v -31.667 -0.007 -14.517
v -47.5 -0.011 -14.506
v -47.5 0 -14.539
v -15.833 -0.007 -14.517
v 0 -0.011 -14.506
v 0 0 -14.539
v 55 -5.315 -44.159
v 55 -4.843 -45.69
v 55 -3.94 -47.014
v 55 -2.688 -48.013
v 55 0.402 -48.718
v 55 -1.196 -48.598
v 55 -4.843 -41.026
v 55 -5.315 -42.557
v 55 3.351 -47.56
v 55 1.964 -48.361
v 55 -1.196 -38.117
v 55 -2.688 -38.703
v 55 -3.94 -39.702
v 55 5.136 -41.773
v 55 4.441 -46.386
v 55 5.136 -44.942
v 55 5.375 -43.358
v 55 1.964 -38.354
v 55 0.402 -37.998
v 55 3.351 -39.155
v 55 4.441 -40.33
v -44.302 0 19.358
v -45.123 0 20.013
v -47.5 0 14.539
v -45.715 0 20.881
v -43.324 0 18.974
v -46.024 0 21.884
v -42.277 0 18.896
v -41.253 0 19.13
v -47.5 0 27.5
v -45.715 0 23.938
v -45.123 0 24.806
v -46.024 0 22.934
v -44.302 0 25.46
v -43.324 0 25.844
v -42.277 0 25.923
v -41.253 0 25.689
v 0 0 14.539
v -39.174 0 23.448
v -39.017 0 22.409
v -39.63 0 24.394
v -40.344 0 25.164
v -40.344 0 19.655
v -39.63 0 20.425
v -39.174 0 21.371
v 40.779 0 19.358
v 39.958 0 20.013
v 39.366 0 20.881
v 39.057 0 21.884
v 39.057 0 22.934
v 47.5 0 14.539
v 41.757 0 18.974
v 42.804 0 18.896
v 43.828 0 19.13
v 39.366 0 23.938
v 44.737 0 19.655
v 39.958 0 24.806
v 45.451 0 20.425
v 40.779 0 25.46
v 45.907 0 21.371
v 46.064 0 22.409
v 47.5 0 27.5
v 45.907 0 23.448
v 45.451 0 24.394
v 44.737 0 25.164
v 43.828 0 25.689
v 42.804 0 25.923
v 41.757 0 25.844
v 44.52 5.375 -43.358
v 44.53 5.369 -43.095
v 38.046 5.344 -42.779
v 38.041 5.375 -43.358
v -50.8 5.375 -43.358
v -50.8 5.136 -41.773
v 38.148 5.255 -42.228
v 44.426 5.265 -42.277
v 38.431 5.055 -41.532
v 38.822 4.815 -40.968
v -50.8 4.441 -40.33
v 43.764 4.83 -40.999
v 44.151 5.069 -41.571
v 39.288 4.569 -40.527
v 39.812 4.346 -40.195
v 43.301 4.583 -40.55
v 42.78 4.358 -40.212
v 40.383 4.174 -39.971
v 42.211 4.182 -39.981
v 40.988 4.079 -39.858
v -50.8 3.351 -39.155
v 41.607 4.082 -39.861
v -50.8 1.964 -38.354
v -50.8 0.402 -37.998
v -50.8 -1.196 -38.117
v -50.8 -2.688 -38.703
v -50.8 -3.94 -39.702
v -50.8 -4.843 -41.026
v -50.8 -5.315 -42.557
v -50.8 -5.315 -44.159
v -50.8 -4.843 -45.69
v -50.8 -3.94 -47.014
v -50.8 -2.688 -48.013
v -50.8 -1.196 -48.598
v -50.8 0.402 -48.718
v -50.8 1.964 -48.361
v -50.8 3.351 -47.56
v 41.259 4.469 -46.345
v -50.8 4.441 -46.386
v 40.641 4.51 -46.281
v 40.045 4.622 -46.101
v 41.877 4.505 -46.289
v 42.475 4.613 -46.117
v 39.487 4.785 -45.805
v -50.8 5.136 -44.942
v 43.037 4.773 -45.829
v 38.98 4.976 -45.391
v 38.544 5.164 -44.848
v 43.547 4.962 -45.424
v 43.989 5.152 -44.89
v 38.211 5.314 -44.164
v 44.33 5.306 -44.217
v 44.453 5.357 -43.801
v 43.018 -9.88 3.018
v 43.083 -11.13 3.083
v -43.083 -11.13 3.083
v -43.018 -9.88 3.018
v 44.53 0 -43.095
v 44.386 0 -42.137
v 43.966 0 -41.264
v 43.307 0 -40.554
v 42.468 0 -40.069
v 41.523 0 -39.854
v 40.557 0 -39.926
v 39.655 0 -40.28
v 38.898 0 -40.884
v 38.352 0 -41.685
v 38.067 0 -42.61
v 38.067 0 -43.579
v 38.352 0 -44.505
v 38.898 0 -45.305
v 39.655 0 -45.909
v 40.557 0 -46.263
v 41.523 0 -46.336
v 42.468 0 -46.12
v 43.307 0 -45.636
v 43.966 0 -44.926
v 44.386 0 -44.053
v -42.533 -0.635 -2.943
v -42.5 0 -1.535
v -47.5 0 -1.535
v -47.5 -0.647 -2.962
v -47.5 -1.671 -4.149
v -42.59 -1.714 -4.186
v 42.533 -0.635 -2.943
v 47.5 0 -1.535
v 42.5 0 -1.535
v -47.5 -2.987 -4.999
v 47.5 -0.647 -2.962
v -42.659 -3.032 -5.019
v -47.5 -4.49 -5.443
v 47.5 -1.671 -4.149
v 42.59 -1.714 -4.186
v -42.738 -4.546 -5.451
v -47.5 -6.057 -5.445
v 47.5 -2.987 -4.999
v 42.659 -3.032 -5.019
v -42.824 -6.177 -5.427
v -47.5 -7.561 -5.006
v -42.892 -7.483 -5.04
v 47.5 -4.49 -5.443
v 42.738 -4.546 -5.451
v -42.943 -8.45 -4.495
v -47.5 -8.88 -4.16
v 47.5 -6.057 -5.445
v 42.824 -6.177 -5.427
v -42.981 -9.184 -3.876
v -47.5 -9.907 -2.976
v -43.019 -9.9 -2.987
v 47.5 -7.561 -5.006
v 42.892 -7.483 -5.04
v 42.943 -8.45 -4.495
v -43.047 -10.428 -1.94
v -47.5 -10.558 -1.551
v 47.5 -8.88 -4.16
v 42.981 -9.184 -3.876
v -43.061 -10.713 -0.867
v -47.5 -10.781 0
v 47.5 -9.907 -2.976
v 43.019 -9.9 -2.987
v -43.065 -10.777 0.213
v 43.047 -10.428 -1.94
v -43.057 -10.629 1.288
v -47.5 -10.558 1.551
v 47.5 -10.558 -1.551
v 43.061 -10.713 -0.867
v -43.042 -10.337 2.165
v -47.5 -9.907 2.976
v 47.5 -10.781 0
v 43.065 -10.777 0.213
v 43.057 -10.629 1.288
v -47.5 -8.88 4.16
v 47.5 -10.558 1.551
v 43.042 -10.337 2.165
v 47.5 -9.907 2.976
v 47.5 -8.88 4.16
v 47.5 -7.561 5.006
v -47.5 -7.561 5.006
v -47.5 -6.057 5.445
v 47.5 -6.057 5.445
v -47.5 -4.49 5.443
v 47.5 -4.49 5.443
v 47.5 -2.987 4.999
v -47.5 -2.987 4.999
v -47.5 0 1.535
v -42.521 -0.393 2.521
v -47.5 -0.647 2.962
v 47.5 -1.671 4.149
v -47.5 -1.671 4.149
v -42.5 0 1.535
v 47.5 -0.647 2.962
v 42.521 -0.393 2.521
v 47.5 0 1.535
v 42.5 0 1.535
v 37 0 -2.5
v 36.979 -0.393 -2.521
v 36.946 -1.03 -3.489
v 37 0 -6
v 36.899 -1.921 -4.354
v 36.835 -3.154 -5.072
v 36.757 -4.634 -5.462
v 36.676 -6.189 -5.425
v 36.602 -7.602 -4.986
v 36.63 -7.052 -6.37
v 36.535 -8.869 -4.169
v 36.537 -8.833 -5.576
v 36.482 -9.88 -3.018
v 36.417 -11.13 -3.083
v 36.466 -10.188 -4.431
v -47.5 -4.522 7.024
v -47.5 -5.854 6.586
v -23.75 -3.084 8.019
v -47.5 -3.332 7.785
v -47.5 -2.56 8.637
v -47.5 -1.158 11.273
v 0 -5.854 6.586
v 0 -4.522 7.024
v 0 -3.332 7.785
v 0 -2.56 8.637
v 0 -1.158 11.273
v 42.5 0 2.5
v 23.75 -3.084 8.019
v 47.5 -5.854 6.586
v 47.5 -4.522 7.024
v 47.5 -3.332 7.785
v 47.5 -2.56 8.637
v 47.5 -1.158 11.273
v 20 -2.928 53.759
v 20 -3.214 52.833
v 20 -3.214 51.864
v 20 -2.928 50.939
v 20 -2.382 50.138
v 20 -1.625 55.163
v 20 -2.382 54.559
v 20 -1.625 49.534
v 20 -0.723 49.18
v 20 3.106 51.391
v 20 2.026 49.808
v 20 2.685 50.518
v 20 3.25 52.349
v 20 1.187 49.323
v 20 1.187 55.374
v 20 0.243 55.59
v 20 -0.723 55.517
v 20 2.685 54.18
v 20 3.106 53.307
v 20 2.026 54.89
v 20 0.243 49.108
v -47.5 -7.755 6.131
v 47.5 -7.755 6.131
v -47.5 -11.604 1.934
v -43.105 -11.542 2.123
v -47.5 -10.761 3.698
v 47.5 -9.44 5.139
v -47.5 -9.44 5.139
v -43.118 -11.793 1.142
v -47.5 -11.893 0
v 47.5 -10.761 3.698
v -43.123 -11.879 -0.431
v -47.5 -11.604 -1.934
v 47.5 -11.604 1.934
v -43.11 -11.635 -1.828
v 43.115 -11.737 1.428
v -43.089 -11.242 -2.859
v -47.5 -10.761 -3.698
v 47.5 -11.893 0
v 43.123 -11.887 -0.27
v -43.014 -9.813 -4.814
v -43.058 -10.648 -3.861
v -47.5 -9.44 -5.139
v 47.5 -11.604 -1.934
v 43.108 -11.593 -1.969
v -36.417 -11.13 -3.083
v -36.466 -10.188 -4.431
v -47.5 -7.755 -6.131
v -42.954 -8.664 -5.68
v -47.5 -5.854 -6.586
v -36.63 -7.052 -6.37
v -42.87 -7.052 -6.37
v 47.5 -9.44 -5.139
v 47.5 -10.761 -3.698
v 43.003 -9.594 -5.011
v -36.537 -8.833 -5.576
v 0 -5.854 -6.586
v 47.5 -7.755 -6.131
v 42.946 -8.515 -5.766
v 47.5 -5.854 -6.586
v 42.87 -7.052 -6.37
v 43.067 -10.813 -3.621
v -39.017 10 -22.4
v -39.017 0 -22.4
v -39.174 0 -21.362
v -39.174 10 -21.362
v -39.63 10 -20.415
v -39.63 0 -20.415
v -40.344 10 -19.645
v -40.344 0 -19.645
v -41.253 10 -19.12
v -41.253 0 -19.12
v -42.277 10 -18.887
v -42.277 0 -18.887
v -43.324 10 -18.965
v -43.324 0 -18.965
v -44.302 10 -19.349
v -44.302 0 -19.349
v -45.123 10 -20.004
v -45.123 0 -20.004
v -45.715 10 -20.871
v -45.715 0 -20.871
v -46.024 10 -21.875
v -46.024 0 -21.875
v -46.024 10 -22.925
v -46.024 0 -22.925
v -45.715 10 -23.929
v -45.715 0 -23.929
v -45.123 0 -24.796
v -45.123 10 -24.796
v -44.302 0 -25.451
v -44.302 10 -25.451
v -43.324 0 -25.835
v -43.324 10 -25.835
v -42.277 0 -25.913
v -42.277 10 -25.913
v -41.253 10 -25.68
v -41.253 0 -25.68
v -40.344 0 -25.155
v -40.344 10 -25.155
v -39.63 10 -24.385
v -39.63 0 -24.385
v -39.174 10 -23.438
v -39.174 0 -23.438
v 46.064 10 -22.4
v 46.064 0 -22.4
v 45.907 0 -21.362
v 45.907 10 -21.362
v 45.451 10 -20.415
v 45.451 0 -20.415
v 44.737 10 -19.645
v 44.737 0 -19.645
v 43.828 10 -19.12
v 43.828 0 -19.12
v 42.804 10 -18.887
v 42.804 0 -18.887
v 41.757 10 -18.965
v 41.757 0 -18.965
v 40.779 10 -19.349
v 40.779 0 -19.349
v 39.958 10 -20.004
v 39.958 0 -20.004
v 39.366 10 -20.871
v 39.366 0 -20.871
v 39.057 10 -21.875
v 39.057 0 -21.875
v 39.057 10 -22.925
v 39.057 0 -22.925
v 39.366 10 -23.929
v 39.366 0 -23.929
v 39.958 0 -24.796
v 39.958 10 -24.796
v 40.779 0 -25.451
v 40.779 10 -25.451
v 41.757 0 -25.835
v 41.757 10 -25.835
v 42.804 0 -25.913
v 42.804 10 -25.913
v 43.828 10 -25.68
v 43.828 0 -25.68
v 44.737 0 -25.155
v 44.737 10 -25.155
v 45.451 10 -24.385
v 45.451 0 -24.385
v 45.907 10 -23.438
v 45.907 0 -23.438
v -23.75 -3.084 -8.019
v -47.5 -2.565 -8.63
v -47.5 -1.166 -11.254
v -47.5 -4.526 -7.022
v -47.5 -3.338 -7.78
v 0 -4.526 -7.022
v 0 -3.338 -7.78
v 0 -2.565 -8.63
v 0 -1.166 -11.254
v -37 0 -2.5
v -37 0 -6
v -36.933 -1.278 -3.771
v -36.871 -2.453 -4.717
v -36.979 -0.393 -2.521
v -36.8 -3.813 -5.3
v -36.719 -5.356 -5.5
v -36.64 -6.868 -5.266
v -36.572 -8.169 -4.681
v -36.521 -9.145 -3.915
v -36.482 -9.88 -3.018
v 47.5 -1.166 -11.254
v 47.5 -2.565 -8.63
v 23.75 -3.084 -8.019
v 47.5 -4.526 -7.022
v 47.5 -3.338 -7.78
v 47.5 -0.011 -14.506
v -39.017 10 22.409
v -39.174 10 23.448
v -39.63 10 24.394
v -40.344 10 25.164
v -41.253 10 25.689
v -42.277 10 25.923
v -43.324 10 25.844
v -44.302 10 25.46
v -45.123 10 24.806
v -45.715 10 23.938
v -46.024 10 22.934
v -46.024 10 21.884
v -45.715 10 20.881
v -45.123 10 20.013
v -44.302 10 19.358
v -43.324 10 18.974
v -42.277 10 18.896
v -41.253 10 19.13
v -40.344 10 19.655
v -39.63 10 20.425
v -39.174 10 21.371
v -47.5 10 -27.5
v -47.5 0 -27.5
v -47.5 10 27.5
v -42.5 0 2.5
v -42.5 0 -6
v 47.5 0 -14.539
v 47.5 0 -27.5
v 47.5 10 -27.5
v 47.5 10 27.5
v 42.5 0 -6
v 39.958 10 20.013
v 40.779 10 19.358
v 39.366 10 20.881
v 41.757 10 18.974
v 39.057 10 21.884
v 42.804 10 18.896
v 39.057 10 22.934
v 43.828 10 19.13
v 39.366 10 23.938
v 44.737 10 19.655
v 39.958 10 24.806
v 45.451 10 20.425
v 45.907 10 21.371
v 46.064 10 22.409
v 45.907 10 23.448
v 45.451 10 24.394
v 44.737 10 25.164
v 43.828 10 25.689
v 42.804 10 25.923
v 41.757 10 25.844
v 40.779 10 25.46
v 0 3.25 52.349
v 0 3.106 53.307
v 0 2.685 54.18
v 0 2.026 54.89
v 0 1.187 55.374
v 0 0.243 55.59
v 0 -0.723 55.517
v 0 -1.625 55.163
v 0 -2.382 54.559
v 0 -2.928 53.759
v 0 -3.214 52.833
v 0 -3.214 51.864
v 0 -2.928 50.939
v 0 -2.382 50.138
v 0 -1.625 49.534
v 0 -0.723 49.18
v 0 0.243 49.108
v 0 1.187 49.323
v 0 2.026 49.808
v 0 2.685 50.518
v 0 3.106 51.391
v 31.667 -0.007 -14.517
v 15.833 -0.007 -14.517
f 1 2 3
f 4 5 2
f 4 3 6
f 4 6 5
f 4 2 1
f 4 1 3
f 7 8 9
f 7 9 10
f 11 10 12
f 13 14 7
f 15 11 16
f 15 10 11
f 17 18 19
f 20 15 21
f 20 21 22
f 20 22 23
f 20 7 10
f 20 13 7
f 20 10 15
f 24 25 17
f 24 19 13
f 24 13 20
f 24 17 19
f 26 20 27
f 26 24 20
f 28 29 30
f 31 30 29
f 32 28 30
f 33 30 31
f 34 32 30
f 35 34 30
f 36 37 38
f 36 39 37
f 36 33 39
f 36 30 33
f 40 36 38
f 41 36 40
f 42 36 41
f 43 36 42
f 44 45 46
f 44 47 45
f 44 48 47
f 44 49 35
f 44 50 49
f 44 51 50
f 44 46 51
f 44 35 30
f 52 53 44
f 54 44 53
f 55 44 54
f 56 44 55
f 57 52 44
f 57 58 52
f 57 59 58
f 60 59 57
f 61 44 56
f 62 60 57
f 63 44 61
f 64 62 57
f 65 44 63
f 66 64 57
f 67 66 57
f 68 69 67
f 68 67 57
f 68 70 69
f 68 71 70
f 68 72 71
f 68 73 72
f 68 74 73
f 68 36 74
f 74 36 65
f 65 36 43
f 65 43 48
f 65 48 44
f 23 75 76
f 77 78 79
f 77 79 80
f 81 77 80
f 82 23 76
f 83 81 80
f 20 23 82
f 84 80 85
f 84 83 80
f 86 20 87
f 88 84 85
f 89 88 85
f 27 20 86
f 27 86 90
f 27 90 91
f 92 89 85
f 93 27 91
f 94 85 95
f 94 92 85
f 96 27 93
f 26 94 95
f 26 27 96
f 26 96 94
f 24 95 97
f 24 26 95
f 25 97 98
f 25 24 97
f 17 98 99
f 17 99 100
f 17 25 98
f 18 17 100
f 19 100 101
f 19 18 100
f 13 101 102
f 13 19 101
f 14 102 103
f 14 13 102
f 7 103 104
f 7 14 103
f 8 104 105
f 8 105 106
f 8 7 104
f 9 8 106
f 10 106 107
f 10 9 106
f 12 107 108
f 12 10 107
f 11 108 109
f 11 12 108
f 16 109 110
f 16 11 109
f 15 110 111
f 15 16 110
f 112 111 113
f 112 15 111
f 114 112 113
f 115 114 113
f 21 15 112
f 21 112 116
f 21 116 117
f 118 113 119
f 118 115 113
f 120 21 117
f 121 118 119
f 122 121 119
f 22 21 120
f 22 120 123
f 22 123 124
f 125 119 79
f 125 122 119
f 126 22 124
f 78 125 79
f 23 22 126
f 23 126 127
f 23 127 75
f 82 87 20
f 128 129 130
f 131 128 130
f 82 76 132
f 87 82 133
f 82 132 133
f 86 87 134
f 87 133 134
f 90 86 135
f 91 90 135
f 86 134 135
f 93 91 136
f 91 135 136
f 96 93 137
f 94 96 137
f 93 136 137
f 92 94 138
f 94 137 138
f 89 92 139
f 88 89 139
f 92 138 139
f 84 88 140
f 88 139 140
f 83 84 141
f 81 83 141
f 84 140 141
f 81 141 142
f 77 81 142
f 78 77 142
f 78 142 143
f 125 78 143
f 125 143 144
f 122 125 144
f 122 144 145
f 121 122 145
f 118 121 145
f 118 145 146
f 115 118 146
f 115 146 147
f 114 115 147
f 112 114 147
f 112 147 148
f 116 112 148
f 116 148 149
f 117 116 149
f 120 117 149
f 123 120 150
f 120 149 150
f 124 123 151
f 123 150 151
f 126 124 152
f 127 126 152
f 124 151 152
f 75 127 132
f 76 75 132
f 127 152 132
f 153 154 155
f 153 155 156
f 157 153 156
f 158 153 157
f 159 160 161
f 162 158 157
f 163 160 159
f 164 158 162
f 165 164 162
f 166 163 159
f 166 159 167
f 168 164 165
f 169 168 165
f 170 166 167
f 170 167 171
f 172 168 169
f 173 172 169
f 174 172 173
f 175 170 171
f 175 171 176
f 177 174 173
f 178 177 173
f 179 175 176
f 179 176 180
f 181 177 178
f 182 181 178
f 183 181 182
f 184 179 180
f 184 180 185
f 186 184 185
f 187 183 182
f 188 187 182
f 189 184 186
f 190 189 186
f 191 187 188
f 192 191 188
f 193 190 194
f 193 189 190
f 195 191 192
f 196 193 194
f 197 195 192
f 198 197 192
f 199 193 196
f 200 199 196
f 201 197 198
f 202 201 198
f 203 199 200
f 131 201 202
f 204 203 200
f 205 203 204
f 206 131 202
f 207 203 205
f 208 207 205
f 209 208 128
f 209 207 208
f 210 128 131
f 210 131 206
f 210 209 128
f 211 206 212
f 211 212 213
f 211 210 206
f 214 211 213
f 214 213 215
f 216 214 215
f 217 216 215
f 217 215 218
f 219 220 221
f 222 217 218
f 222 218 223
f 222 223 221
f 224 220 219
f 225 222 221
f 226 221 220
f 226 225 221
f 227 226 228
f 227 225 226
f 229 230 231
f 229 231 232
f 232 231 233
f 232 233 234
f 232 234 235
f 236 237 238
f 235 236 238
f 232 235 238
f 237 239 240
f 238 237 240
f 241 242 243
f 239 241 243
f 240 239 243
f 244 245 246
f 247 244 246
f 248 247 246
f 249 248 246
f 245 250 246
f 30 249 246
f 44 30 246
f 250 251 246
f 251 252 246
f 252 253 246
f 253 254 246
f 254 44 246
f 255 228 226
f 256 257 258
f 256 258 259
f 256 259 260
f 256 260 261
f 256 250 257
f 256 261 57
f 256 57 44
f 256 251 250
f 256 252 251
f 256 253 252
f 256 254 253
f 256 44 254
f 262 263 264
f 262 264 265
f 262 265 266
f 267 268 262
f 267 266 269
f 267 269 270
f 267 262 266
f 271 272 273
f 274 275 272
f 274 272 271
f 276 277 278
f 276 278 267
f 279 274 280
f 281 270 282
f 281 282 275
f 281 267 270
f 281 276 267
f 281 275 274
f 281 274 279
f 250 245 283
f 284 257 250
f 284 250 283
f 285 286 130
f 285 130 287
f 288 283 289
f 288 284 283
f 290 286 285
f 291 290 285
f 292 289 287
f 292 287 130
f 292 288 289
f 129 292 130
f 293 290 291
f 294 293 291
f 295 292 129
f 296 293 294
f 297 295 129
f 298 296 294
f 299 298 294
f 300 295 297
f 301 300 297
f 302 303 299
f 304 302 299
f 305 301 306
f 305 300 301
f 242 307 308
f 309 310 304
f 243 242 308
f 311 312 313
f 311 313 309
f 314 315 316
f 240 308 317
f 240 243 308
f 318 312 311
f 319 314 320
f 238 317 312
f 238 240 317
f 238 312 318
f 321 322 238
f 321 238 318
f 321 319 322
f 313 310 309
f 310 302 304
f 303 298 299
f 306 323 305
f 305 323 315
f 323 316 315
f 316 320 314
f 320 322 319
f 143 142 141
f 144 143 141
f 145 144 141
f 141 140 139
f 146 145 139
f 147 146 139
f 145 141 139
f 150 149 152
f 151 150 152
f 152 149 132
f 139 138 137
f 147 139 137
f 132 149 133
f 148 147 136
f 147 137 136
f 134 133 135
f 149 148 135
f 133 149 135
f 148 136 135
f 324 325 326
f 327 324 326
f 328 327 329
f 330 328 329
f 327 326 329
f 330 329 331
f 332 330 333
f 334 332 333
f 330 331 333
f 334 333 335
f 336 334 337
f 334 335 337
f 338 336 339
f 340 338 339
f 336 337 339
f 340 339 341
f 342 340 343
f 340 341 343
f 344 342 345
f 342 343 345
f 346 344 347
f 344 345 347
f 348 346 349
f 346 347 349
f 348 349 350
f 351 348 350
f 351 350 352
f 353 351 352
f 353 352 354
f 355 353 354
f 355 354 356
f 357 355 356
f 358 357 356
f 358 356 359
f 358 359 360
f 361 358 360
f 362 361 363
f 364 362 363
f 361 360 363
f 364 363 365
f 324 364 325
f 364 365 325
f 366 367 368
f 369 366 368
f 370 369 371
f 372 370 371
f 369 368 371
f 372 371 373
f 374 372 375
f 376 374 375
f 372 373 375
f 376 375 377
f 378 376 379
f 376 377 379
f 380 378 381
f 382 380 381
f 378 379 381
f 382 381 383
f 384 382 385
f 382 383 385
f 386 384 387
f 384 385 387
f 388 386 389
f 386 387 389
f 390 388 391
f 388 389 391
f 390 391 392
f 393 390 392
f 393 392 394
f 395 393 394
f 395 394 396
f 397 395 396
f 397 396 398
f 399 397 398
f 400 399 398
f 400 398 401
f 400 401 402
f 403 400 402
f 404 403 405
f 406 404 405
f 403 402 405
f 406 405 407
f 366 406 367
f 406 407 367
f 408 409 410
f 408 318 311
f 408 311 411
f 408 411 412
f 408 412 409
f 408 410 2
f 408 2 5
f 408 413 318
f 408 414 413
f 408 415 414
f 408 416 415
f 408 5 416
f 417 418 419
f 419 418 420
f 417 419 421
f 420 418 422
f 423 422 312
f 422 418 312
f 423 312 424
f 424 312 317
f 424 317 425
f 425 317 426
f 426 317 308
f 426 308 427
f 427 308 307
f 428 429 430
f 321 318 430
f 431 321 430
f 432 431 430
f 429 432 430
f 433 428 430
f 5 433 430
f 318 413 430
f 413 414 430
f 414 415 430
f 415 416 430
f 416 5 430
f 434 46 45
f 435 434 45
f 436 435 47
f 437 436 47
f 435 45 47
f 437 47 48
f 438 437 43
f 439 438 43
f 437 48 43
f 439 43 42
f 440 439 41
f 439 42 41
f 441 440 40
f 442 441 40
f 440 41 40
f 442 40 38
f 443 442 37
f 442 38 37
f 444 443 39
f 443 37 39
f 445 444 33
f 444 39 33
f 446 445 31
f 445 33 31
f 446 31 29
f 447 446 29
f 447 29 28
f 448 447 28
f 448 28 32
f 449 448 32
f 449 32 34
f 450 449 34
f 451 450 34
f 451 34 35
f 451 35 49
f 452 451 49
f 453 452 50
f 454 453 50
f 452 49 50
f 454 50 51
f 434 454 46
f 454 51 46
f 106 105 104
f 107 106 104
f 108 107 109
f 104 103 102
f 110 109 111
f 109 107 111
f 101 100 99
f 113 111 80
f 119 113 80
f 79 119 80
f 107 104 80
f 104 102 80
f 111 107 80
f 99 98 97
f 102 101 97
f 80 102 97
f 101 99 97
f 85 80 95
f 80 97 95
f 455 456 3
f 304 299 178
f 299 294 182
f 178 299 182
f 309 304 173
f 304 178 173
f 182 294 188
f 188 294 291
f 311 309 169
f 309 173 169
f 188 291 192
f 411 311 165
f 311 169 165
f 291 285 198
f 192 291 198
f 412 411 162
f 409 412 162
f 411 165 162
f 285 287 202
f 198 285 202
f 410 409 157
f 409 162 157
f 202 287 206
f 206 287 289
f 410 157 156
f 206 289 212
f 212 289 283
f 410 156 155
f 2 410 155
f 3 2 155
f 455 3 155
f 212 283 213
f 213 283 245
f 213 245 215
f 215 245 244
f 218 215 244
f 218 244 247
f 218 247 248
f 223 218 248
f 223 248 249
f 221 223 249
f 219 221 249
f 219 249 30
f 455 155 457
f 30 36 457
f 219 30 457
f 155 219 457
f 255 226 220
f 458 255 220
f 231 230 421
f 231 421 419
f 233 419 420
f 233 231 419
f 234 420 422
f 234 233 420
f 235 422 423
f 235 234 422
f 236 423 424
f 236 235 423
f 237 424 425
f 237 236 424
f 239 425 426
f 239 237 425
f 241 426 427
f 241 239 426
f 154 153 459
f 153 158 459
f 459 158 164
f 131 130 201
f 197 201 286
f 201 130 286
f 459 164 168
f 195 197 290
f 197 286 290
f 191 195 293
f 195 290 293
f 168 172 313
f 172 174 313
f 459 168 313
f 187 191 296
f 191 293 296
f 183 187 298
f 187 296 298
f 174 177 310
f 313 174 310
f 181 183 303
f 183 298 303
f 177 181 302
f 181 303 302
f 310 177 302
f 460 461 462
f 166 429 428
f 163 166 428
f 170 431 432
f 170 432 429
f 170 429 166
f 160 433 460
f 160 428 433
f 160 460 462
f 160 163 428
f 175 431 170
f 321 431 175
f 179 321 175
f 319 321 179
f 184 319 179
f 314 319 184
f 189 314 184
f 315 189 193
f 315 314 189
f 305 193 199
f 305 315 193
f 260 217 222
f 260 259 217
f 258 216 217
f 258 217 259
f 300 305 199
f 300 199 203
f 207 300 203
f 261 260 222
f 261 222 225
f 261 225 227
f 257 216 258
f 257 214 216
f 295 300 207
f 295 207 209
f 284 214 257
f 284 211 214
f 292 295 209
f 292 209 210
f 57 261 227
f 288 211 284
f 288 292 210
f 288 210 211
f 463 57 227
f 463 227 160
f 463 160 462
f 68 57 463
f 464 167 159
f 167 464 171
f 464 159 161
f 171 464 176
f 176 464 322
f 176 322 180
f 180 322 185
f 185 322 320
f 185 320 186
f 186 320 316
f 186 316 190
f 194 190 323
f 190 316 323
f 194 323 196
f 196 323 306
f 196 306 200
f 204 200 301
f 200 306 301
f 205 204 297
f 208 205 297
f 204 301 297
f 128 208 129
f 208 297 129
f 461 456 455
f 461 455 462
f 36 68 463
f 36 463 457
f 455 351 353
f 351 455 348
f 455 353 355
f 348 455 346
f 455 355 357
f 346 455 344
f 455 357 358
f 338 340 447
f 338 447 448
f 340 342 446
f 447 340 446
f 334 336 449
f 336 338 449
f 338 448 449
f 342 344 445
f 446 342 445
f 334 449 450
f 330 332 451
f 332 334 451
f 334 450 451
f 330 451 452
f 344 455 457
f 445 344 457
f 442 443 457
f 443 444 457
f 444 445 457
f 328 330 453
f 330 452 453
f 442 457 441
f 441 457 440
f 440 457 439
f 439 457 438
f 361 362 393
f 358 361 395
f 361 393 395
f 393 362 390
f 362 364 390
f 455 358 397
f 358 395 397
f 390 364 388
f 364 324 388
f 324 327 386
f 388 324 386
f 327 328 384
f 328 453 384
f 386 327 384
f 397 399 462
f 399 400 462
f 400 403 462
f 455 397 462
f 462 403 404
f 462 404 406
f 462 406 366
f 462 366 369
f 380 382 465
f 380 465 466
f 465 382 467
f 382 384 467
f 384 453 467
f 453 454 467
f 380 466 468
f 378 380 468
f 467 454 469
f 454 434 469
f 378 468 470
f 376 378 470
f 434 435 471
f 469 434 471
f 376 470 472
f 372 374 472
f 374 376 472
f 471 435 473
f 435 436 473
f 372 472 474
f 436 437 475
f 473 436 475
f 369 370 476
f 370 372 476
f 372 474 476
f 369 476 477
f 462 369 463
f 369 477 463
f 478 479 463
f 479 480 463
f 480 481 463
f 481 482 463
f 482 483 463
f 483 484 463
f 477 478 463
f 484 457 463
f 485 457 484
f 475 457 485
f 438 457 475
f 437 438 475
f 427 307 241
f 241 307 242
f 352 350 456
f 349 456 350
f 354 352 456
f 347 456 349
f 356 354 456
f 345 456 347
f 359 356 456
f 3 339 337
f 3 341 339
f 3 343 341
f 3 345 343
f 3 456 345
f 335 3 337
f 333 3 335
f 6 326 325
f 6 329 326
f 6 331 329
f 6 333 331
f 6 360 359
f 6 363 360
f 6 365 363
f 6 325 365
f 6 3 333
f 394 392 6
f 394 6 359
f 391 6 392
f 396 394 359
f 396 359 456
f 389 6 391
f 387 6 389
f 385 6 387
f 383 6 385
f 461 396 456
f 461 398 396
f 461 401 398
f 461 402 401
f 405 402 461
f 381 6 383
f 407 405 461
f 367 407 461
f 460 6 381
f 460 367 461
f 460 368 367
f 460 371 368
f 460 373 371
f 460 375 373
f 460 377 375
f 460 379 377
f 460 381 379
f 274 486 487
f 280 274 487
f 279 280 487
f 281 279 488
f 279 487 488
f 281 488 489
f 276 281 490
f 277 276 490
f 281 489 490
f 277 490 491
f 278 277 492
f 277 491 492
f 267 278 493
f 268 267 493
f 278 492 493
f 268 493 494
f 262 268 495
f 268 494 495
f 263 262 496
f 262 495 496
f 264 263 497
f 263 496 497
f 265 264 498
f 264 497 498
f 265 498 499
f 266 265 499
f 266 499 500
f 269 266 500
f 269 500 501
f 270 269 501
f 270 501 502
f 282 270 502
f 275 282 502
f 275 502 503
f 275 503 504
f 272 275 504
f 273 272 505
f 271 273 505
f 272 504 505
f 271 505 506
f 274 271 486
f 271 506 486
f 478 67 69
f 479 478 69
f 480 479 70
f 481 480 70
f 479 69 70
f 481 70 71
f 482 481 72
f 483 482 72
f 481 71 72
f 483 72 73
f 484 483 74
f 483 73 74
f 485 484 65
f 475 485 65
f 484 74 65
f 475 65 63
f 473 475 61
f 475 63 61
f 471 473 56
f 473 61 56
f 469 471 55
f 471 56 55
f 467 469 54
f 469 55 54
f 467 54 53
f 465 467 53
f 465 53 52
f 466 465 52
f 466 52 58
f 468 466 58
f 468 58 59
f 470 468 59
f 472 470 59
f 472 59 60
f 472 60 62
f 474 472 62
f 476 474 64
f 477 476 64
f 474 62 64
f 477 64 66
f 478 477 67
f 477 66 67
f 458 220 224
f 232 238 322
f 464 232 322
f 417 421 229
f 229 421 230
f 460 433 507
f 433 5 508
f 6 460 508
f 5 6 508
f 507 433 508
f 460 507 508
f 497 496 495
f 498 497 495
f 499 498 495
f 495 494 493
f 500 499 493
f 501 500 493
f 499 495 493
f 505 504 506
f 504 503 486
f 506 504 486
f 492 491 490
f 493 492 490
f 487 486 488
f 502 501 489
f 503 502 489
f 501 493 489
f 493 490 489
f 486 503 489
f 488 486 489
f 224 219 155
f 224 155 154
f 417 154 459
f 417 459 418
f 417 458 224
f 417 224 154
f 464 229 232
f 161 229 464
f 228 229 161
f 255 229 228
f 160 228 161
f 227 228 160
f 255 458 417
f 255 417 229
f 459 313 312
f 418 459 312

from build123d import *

# Parameters (mm, degrees)
F0_W      = 47.5
F0_H      = 55
F0_R      = 3.5231538004
F2_DEPTH  = 10
F3_DEPTH  = 47.5
F4_DEPTH  = 47.5
F5_W      = 5.5
F5_H      = 3.5
F6_DEPTH  = 116
F6_TAPER  = -3
F7_R      = 5.375
F8_DEPTH  = 55
F9_DEPTH  = 50.8
F10_R     = 3.25
F11_DEPTH = 25
F12_R     = 3.25
F13_DEPTH = 20


# Not quite as in the source:
# - an extrude ends at something that could not be found from the text; its depth is read off the source's solid


with BuildPart() as f2:
    # F0 (on Front) → F2 (new body)
    with BuildSketch(Plane.XZ):
        with Locations((-23.75, 0)):
            Rectangle(F0_W, F0_H)
        with Locations((-42.5404943526, -22.3999973387)):
            Circle(F0_R, mode=Mode.SUBTRACT)
        with Locations((-42.5404943526, 22.4092733115)):
            Circle(F0_R, mode=Mode.SUBTRACT)
        with Locations((23.75, 0)):
            Rectangle(F0_W, F0_H)
        with Locations((42.5404943526, -22.3999973387)):
            Circle(F0_R, mode=Mode.SUBTRACT)
        with Locations((42.5404943526, 22.4092733115)):
            Circle(F0_R, mode=Mode.SUBTRACT)
    extrude(amount=-F2_DEPTH)

    # F1 (on Right) → F3 (join)
    with BuildSketch(Plane.YZ):
        with BuildLine():
            ThreePointArc((0, -3.9765159025), (0.9884114859, -2.0964597633), (1.32962229, 0))
            ThreePointArc((1.32962229, 0), (0.9884114859, 2.0964597633), (0, 3.9765159025))
            Line((0, 3.9765159025), (0, 1.5348697397))
            ThreePointArc((0, 1.5348697397), (0.1636057764, 0.7751725864), (0.2185063777, 0))
            ThreePointArc((0.2185063777, 0), (0.1636057764, -0.7751725864), (0, -1.5348697397))
            Line((0, -1.5348697397), (0, -3.9765159025))
        make_face()
        with BuildLine():
            Line((0, -14.5392882731), (0, -14.5063873886))
            Line((0, -14.5063873886), (-0.0106325767, -14.5063873886))
            add(Edge.make_bspline(
                [(-0.0106325767, -14.5063873886), (-0.0070875742, -14.5173526167), (-0.0035433916, -14.5283196043), (0, -14.5392882731)],
                knots=[0.9975914602, 0.9975914602, 0.9975914602, 0.9975914602, 1, 1, 1, 1], degree=3))
        make_face()
        with BuildLine():
            Line((0, -14.5063873886), (0, -3.9765159025))
            ThreePointArc((0, -3.9765159025), (-2.5895292088, -6.0382266604), (-5.8538725864, -6.5862915155))
            add(Edge.make_bspline(
                [(-5.8538725864, -6.5862915155), (-4.8215552648, -6.8255458917), (-2.2801846921, -7.8765294876), (-0.8570999414, -11.8881360206), (-0.0106325767, -14.5063873886)],
                knots=[0.0813250355, 0.0813250355, 0.0813250355, 0.0813250355, 0.4224859886, 0.9975914602, 0.9975914602, 0.9975914602, 0.9975914602], degree=3))
            Line((-0.0106325767, -14.5063873886), (0, -14.5063873886))
        make_face()
        with BuildLine():
            Line((0, 1.5348697397), (0, 3.9765159025))
            ThreePointArc((0, 3.9765159025), (-2.5895292088, 6.0382266604), (-5.8538725864, 6.5862915155))
            ThreePointArc((-5.8538725864, 6.5862915155), (-11.8926095346, 0), (-5.8538725864, -6.5862915155))
            ThreePointArc((-5.8538725864, -6.5862915155), (-2.5895292088, -6.0382266604), (0, -3.9765159025))
            Line((0, -3.9765159025), (0, -1.5348697397))
            ThreePointArc((0, -1.5348697397), (-10.7814936223, 0), (0, 1.5348697397))
        make_face()
        with BuildLine():
            ThreePointArc((-5.8538725864, 6.5862915155), (-2.5895292088, 6.0382266604), (0, 3.9765159025))
            Line((0, 3.9765159025), (0, 14.5392882731))
            add(Edge.make_bspline(
                [(-5.8538725864, 6.5862915155), (-4.8215552648, 6.8255458917), (-2.2735043292, 7.8792921512), (-0.8496260973, 11.9092466626), (0, 14.5392882731)],
                knots=[0.0813250355, 0.0813250355, 0.0813250355, 0.0813250355, 0.4224859886, 1, 1, 1, 1], degree=3))
        make_face()
    extrude(amount=F3_DEPTH)

    # F4 (add): a face of the model
    f4_faces = [f2.faces().sort_by_distance(p)[0] for p in [
        (0, -0.31416521, -8.0370790064),
    ]]
    extrude(f4_faces, amount=F4_DEPTH)

    # F5 (on Front) → F6 (cut, through all)
    with BuildSketch(Plane.XZ):
        with Locations((-39.75, -4.25)):
            Rectangle(F5_W, F5_H)
        with Locations((39.75, -4.25)):
            Rectangle(F5_W, F5_H)
        Polygon((37, -2.5), (42.5, -2.5), (42.5, 2.5), (-42.5, 2.5), (-42.5, -2.5), (-37, -2.5), align=None)
    extrude(amount=F6_DEPTH, taper=F6_TAPER, mode=Mode.SUBTRACT)


with BuildPart() as f8:
    # F7 (on Right) → F8 (new body)
    with BuildSketch(Plane.YZ):
        with Locations((0, -43.3576591313)):
            Circle(F7_R)
    extrude(amount=F8_DEPTH)

    # F9 (add): a face of the model
    f9_faces = [f8.faces().sort_by_distance(p)[0] for p in [
        (0, 0, -43.3576591313),
    ]]
    extrude(f9_faces, amount=F9_DEPTH)

    # F10 (on Front) → F11 (cut)
    with BuildSketch(Plane.XZ):
        with Locations((41.2802435458, -43.0947579443)):
            Circle(F10_R)
    extrude(amount=-F11_DEPTH, mode=Mode.SUBTRACT)


with BuildPart() as f13:
    # F12 (on Right) → F13 (new body)
    with BuildSketch(Plane.YZ):
        with Locations((0, 52.3487925529)):
            Circle(F12_R)
    extrude(amount=F13_DEPTH)


solid = Compound([f2.part, f8.part, f13.part])
